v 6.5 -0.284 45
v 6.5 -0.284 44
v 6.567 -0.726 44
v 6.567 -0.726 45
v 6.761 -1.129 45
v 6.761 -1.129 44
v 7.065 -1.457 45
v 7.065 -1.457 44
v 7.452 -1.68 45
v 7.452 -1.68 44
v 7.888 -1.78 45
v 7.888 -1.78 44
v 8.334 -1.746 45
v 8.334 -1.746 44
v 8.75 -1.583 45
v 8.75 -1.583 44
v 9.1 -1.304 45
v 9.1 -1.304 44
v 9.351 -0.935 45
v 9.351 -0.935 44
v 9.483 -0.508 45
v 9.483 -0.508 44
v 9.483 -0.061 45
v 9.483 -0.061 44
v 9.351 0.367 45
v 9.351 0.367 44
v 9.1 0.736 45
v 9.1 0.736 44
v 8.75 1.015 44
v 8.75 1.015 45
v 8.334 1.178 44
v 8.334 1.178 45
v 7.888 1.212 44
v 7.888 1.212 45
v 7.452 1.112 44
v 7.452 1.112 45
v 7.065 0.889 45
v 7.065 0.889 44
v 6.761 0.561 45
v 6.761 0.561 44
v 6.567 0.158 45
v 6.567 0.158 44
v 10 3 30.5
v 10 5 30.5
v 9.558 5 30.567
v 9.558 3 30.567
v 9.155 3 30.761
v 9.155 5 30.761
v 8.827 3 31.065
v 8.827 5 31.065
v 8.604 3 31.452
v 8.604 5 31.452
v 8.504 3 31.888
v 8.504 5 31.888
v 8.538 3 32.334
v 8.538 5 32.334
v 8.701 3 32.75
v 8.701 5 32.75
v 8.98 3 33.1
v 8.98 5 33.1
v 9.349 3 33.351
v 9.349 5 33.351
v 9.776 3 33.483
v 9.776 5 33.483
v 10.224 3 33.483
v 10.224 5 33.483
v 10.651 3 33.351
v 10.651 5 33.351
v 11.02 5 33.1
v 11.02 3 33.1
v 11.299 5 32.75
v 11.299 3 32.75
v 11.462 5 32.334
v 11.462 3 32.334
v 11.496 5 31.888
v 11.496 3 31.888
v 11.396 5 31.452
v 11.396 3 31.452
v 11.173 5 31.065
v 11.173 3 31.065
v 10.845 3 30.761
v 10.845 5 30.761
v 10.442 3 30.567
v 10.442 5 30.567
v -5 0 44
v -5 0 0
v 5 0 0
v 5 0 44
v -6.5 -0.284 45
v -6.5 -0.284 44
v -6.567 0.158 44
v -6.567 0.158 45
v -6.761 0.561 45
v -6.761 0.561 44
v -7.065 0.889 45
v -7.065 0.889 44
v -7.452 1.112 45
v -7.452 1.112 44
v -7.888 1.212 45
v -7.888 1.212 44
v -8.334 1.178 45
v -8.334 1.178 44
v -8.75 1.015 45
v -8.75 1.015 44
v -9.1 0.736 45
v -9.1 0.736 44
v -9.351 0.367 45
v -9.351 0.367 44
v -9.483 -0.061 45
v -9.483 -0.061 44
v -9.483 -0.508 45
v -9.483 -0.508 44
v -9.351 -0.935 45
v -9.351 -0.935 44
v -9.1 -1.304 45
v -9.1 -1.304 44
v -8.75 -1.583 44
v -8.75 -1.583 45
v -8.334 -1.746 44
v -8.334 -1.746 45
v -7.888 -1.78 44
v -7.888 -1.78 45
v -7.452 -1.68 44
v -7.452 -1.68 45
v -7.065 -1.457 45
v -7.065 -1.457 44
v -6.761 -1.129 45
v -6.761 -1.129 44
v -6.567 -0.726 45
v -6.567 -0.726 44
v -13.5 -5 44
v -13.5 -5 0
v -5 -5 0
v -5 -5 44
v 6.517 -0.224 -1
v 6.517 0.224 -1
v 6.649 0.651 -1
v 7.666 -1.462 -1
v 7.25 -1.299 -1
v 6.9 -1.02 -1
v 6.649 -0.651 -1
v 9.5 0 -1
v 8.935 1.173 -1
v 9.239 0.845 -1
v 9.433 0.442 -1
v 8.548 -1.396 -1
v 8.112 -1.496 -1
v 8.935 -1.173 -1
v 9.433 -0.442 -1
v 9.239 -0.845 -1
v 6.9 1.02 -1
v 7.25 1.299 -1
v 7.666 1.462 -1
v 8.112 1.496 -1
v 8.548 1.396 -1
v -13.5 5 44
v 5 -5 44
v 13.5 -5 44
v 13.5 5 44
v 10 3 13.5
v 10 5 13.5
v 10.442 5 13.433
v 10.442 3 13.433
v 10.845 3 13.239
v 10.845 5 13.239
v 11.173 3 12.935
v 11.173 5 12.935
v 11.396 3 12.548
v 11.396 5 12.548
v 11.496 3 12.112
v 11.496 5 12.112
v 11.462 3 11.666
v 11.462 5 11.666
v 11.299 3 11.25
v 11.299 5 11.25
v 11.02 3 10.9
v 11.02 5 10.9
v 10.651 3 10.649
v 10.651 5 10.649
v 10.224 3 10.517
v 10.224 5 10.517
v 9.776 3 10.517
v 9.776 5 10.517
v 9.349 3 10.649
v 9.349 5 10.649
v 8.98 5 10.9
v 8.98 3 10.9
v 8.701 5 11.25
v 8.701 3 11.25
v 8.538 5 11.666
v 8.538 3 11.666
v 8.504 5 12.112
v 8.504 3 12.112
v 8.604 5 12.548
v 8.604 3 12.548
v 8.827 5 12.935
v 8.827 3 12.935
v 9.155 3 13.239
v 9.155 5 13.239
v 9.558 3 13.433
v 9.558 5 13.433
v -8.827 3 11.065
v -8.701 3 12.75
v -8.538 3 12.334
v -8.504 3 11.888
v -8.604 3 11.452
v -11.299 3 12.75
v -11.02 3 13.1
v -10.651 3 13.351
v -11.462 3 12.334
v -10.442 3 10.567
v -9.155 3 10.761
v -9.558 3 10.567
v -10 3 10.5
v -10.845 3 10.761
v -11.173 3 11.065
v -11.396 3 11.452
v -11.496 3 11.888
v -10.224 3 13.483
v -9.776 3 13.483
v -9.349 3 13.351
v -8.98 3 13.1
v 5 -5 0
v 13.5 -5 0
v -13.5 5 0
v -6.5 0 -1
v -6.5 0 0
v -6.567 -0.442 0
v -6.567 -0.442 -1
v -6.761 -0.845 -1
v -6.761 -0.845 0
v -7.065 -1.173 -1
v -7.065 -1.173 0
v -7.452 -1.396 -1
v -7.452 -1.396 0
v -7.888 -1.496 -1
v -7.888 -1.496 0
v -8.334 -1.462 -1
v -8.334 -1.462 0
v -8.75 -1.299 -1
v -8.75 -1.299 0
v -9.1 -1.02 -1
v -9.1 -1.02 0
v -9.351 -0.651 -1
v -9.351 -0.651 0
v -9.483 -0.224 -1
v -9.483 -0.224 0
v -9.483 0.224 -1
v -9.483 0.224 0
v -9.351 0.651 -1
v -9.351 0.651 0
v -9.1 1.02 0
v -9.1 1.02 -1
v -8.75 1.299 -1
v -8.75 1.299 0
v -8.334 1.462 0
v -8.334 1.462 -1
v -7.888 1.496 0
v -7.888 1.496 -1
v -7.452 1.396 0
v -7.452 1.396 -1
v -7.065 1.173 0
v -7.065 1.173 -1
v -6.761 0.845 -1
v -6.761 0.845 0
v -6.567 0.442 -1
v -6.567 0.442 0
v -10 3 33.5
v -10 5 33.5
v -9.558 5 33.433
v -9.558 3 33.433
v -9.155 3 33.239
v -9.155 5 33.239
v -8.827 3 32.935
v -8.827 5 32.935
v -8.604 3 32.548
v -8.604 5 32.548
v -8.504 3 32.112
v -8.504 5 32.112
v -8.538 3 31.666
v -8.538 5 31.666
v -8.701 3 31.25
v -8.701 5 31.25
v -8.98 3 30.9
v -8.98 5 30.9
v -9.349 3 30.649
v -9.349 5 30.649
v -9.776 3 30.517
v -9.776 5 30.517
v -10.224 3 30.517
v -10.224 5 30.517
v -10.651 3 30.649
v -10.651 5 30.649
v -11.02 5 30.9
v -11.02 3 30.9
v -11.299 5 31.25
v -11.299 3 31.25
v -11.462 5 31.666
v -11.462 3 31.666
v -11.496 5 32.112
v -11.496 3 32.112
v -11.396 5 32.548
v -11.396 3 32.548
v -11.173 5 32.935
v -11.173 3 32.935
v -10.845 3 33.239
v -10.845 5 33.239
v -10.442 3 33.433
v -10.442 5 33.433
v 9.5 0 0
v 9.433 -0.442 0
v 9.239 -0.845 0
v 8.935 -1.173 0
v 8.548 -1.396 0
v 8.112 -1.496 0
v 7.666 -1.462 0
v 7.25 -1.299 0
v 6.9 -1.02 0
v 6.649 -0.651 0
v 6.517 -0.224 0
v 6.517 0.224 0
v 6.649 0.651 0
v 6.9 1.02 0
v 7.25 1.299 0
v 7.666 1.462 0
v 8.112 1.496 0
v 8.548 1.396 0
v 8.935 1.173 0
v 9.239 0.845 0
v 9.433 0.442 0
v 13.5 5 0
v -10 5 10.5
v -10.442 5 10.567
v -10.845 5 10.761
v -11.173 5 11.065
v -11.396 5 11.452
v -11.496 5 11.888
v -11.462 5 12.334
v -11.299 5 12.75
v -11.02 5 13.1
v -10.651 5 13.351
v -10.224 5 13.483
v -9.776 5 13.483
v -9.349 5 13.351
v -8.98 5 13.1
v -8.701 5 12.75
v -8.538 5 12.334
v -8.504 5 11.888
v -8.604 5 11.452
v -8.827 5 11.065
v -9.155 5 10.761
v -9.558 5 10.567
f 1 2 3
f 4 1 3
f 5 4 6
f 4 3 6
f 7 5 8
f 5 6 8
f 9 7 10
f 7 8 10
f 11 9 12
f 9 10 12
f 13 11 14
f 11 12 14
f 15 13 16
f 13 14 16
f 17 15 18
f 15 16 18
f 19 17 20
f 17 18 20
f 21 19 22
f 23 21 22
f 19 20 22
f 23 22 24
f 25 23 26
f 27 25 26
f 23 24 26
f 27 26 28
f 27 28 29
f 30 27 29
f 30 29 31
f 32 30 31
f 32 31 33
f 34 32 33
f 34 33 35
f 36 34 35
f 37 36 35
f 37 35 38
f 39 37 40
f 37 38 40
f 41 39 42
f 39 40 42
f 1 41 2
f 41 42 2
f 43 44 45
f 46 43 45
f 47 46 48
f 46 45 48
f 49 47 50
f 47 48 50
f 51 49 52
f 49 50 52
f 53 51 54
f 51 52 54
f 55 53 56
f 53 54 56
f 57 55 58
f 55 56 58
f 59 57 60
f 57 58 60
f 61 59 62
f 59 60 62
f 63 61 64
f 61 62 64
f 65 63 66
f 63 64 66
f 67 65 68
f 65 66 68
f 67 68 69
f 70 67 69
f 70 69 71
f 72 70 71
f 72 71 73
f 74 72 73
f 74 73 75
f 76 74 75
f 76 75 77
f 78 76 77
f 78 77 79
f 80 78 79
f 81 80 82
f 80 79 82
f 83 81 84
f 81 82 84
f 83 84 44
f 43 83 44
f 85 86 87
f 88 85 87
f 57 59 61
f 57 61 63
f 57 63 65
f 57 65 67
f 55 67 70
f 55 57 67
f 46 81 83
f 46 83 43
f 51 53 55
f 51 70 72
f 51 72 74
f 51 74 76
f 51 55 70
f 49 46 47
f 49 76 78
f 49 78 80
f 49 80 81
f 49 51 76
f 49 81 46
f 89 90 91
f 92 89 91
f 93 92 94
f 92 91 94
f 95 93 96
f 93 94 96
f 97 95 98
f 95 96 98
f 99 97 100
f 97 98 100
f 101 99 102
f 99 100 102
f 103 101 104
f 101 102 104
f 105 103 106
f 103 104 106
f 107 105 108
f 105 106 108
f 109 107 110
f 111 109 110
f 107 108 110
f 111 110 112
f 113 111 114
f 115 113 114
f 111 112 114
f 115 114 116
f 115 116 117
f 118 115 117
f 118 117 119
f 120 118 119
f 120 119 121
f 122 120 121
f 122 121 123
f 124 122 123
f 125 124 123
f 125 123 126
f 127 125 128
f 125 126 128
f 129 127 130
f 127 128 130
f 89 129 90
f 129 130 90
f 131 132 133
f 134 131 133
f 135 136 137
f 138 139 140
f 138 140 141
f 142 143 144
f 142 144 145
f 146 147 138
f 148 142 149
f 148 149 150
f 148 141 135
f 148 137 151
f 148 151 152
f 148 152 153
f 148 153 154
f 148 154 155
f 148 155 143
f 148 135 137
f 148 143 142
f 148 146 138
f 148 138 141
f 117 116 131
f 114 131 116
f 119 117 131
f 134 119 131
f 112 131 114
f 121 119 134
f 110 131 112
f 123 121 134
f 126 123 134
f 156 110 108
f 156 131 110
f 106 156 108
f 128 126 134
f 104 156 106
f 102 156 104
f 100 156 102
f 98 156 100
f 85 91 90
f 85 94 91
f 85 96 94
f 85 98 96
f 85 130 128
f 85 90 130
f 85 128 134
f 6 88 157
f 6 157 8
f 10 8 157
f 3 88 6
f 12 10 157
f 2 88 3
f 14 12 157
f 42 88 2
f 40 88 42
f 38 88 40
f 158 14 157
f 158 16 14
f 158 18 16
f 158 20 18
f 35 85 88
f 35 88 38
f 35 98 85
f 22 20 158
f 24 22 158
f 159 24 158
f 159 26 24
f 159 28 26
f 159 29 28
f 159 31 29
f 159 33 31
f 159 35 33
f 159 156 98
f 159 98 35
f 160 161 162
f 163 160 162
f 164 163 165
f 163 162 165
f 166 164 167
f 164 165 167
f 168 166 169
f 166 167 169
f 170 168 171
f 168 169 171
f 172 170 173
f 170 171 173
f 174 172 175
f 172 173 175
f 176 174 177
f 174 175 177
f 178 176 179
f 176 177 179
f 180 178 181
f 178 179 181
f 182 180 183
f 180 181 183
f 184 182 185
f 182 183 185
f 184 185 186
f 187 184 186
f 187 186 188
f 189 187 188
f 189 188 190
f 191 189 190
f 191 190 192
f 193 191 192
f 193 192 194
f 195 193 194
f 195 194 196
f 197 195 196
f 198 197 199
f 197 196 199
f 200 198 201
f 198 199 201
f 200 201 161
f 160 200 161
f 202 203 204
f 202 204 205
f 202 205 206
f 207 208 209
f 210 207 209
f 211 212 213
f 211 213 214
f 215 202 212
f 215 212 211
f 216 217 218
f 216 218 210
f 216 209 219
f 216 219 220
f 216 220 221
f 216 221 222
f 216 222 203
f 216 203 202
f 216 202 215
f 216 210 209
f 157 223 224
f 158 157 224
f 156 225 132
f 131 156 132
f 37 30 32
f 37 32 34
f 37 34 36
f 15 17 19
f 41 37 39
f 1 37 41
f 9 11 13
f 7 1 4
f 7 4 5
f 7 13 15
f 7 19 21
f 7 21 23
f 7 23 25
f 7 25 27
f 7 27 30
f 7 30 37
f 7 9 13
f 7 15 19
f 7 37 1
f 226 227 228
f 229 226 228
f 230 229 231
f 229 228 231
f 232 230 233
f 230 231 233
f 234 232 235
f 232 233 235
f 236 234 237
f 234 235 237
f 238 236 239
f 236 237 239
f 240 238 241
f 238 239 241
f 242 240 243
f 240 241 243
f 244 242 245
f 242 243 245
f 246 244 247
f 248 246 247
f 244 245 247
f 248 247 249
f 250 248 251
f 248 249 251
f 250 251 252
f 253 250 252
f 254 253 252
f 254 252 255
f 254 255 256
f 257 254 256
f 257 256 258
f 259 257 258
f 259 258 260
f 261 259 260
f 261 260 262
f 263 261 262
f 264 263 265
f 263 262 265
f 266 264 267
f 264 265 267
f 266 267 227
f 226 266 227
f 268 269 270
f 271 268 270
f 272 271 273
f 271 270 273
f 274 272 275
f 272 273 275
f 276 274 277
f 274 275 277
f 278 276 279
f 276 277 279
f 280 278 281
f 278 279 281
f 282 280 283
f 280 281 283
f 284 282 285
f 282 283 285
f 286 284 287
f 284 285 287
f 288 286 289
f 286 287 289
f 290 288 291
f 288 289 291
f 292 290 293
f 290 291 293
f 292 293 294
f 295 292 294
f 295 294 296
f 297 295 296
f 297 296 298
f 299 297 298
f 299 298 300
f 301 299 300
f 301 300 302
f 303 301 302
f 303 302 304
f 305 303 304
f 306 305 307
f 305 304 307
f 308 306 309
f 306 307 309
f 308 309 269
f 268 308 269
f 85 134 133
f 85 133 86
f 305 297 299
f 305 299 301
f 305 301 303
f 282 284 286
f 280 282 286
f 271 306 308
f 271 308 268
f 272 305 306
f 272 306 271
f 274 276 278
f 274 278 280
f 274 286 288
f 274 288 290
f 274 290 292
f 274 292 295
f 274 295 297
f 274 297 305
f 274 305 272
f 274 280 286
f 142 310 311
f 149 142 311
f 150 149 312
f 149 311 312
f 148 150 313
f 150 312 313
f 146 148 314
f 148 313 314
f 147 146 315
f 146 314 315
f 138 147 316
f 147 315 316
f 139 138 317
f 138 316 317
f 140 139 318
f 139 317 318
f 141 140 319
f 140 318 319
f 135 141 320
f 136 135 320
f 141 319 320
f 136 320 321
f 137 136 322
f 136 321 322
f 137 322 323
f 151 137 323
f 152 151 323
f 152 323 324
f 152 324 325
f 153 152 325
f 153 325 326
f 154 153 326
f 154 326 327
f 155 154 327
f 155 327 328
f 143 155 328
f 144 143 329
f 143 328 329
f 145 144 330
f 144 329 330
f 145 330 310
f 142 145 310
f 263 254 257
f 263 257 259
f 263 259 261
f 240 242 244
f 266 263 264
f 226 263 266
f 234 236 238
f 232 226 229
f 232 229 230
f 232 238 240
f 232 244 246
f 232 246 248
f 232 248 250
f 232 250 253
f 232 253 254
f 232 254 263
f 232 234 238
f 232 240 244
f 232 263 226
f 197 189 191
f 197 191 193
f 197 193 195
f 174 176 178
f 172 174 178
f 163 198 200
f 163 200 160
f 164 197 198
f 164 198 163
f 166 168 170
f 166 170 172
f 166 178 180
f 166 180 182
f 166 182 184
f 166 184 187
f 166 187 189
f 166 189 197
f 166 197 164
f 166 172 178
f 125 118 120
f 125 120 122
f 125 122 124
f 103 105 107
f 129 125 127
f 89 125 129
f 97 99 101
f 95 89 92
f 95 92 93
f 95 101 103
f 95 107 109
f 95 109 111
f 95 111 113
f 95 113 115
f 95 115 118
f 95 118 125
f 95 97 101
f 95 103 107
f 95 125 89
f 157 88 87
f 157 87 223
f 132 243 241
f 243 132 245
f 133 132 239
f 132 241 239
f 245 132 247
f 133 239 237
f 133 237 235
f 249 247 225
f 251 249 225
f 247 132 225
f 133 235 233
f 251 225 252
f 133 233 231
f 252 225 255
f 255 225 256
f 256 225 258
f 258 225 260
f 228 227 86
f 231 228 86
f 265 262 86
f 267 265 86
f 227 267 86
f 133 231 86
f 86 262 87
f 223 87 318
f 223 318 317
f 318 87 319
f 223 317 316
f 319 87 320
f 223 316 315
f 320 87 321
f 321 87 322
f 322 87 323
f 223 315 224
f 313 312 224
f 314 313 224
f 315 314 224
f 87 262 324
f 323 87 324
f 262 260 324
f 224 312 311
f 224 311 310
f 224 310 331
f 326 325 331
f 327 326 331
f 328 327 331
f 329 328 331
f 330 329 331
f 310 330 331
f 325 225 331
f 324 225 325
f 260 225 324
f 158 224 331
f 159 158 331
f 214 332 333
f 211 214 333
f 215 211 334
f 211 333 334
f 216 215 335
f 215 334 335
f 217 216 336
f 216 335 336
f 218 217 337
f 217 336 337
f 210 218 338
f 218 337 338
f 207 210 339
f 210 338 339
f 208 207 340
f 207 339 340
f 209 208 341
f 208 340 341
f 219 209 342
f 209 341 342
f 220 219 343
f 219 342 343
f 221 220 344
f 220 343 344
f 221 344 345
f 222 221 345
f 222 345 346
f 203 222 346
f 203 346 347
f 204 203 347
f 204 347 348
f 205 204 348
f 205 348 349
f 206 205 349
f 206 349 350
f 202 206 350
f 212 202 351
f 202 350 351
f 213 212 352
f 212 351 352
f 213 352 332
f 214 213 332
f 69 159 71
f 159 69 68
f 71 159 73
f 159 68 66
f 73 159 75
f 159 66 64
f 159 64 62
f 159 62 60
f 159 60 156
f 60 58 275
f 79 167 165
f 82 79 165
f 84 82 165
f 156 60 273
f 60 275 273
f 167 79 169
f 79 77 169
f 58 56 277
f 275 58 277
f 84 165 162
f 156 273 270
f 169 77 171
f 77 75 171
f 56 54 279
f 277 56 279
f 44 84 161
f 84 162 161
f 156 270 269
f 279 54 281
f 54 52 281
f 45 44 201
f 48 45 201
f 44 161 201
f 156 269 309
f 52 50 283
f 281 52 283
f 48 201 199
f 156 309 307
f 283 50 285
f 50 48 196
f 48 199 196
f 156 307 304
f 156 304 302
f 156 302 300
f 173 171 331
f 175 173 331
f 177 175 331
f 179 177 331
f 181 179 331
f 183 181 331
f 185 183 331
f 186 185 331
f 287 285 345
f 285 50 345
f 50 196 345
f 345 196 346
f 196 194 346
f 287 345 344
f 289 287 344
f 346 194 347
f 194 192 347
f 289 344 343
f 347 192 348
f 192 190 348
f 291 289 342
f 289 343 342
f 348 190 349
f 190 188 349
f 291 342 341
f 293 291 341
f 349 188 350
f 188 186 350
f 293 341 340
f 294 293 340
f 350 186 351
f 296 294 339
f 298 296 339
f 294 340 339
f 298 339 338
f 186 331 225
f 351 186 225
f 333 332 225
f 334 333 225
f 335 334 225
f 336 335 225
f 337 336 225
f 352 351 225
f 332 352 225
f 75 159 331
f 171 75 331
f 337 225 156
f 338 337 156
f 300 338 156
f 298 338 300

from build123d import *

# Parameters (mm, degrees)
EXTRUDE_1_DEPTH     = 44
SKETCH_2_R          = 1.5
CUT_EXTRUDE_1_DEPTH = 2
SKETCH_3_R          = 1.5
EXTRUDE_2_DEPTH     = 1
SKETCH_4_R          = 1.5
EXTRUDE_3_DEPTH     = 1


with BuildPart() as part:
    # 草圖1 → 填料-伸長1 (new body)
    with BuildSketch(Plane.XY):
        Polygon((5, -5), (13.5, -5), (13.5, 5), (-13.5, 5), (-13.5, -5), (-5, -5), (-5, 0), (5, 0), align=None)
    extrude(amount=EXTRUDE_1_DEPTH)

    # 草圖2 → 除料-伸長1 (cut)
    with BuildSketch(Plane(origin=(0, 5, 0), x_dir=(1, 0, 0), z_dir=(0, 1, 0))):
        with Locations(Location((-10, -32, 0), (0, 0, 270))):
            Circle(SKETCH_2_R)
        with Locations(Location((10, -32, 0), (0, 0, 90))):
            Circle(SKETCH_2_R)
        with Locations(Location((10, -12, 0), (0, 0, 270))):
            Circle(SKETCH_2_R)
        with Locations(Location((-10, -12, 0), (0, 0, 90))):
            Circle(SKETCH_2_R)
    extrude(amount=-CUT_EXTRUDE_1_DEPTH, mode=Mode.SUBTRACT)

    # 草圖3 → 填料-伸長2 (add)
    with BuildSketch(Plane.XY.offset(44)):
        with Locations((-8, -0.28409819)):
            Circle(SKETCH_3_R)
        with Locations(Location((8, -0.28409819, 0), (0, 0, 180))):
            Circle(SKETCH_3_R)
    extrude(amount=EXTRUDE_2_DEPTH)

    # 草圖4 → 填料-伸長3 (add)
    with BuildSketch(Plane(origin=(0, 0, 0), x_dir=(-1, 0, 0), z_dir=(0, 0, -1))):
        with Locations(Location((-8, 0, 0), (0, 0, 180))):
            Circle(SKETCH_4_R)
        with Locations(Location((8, 0, 0), (0, 0, 180))):
            Circle(SKETCH_4_R)
    extrude(amount=EXTRUDE_3_DEPTH)


solid = part.part
